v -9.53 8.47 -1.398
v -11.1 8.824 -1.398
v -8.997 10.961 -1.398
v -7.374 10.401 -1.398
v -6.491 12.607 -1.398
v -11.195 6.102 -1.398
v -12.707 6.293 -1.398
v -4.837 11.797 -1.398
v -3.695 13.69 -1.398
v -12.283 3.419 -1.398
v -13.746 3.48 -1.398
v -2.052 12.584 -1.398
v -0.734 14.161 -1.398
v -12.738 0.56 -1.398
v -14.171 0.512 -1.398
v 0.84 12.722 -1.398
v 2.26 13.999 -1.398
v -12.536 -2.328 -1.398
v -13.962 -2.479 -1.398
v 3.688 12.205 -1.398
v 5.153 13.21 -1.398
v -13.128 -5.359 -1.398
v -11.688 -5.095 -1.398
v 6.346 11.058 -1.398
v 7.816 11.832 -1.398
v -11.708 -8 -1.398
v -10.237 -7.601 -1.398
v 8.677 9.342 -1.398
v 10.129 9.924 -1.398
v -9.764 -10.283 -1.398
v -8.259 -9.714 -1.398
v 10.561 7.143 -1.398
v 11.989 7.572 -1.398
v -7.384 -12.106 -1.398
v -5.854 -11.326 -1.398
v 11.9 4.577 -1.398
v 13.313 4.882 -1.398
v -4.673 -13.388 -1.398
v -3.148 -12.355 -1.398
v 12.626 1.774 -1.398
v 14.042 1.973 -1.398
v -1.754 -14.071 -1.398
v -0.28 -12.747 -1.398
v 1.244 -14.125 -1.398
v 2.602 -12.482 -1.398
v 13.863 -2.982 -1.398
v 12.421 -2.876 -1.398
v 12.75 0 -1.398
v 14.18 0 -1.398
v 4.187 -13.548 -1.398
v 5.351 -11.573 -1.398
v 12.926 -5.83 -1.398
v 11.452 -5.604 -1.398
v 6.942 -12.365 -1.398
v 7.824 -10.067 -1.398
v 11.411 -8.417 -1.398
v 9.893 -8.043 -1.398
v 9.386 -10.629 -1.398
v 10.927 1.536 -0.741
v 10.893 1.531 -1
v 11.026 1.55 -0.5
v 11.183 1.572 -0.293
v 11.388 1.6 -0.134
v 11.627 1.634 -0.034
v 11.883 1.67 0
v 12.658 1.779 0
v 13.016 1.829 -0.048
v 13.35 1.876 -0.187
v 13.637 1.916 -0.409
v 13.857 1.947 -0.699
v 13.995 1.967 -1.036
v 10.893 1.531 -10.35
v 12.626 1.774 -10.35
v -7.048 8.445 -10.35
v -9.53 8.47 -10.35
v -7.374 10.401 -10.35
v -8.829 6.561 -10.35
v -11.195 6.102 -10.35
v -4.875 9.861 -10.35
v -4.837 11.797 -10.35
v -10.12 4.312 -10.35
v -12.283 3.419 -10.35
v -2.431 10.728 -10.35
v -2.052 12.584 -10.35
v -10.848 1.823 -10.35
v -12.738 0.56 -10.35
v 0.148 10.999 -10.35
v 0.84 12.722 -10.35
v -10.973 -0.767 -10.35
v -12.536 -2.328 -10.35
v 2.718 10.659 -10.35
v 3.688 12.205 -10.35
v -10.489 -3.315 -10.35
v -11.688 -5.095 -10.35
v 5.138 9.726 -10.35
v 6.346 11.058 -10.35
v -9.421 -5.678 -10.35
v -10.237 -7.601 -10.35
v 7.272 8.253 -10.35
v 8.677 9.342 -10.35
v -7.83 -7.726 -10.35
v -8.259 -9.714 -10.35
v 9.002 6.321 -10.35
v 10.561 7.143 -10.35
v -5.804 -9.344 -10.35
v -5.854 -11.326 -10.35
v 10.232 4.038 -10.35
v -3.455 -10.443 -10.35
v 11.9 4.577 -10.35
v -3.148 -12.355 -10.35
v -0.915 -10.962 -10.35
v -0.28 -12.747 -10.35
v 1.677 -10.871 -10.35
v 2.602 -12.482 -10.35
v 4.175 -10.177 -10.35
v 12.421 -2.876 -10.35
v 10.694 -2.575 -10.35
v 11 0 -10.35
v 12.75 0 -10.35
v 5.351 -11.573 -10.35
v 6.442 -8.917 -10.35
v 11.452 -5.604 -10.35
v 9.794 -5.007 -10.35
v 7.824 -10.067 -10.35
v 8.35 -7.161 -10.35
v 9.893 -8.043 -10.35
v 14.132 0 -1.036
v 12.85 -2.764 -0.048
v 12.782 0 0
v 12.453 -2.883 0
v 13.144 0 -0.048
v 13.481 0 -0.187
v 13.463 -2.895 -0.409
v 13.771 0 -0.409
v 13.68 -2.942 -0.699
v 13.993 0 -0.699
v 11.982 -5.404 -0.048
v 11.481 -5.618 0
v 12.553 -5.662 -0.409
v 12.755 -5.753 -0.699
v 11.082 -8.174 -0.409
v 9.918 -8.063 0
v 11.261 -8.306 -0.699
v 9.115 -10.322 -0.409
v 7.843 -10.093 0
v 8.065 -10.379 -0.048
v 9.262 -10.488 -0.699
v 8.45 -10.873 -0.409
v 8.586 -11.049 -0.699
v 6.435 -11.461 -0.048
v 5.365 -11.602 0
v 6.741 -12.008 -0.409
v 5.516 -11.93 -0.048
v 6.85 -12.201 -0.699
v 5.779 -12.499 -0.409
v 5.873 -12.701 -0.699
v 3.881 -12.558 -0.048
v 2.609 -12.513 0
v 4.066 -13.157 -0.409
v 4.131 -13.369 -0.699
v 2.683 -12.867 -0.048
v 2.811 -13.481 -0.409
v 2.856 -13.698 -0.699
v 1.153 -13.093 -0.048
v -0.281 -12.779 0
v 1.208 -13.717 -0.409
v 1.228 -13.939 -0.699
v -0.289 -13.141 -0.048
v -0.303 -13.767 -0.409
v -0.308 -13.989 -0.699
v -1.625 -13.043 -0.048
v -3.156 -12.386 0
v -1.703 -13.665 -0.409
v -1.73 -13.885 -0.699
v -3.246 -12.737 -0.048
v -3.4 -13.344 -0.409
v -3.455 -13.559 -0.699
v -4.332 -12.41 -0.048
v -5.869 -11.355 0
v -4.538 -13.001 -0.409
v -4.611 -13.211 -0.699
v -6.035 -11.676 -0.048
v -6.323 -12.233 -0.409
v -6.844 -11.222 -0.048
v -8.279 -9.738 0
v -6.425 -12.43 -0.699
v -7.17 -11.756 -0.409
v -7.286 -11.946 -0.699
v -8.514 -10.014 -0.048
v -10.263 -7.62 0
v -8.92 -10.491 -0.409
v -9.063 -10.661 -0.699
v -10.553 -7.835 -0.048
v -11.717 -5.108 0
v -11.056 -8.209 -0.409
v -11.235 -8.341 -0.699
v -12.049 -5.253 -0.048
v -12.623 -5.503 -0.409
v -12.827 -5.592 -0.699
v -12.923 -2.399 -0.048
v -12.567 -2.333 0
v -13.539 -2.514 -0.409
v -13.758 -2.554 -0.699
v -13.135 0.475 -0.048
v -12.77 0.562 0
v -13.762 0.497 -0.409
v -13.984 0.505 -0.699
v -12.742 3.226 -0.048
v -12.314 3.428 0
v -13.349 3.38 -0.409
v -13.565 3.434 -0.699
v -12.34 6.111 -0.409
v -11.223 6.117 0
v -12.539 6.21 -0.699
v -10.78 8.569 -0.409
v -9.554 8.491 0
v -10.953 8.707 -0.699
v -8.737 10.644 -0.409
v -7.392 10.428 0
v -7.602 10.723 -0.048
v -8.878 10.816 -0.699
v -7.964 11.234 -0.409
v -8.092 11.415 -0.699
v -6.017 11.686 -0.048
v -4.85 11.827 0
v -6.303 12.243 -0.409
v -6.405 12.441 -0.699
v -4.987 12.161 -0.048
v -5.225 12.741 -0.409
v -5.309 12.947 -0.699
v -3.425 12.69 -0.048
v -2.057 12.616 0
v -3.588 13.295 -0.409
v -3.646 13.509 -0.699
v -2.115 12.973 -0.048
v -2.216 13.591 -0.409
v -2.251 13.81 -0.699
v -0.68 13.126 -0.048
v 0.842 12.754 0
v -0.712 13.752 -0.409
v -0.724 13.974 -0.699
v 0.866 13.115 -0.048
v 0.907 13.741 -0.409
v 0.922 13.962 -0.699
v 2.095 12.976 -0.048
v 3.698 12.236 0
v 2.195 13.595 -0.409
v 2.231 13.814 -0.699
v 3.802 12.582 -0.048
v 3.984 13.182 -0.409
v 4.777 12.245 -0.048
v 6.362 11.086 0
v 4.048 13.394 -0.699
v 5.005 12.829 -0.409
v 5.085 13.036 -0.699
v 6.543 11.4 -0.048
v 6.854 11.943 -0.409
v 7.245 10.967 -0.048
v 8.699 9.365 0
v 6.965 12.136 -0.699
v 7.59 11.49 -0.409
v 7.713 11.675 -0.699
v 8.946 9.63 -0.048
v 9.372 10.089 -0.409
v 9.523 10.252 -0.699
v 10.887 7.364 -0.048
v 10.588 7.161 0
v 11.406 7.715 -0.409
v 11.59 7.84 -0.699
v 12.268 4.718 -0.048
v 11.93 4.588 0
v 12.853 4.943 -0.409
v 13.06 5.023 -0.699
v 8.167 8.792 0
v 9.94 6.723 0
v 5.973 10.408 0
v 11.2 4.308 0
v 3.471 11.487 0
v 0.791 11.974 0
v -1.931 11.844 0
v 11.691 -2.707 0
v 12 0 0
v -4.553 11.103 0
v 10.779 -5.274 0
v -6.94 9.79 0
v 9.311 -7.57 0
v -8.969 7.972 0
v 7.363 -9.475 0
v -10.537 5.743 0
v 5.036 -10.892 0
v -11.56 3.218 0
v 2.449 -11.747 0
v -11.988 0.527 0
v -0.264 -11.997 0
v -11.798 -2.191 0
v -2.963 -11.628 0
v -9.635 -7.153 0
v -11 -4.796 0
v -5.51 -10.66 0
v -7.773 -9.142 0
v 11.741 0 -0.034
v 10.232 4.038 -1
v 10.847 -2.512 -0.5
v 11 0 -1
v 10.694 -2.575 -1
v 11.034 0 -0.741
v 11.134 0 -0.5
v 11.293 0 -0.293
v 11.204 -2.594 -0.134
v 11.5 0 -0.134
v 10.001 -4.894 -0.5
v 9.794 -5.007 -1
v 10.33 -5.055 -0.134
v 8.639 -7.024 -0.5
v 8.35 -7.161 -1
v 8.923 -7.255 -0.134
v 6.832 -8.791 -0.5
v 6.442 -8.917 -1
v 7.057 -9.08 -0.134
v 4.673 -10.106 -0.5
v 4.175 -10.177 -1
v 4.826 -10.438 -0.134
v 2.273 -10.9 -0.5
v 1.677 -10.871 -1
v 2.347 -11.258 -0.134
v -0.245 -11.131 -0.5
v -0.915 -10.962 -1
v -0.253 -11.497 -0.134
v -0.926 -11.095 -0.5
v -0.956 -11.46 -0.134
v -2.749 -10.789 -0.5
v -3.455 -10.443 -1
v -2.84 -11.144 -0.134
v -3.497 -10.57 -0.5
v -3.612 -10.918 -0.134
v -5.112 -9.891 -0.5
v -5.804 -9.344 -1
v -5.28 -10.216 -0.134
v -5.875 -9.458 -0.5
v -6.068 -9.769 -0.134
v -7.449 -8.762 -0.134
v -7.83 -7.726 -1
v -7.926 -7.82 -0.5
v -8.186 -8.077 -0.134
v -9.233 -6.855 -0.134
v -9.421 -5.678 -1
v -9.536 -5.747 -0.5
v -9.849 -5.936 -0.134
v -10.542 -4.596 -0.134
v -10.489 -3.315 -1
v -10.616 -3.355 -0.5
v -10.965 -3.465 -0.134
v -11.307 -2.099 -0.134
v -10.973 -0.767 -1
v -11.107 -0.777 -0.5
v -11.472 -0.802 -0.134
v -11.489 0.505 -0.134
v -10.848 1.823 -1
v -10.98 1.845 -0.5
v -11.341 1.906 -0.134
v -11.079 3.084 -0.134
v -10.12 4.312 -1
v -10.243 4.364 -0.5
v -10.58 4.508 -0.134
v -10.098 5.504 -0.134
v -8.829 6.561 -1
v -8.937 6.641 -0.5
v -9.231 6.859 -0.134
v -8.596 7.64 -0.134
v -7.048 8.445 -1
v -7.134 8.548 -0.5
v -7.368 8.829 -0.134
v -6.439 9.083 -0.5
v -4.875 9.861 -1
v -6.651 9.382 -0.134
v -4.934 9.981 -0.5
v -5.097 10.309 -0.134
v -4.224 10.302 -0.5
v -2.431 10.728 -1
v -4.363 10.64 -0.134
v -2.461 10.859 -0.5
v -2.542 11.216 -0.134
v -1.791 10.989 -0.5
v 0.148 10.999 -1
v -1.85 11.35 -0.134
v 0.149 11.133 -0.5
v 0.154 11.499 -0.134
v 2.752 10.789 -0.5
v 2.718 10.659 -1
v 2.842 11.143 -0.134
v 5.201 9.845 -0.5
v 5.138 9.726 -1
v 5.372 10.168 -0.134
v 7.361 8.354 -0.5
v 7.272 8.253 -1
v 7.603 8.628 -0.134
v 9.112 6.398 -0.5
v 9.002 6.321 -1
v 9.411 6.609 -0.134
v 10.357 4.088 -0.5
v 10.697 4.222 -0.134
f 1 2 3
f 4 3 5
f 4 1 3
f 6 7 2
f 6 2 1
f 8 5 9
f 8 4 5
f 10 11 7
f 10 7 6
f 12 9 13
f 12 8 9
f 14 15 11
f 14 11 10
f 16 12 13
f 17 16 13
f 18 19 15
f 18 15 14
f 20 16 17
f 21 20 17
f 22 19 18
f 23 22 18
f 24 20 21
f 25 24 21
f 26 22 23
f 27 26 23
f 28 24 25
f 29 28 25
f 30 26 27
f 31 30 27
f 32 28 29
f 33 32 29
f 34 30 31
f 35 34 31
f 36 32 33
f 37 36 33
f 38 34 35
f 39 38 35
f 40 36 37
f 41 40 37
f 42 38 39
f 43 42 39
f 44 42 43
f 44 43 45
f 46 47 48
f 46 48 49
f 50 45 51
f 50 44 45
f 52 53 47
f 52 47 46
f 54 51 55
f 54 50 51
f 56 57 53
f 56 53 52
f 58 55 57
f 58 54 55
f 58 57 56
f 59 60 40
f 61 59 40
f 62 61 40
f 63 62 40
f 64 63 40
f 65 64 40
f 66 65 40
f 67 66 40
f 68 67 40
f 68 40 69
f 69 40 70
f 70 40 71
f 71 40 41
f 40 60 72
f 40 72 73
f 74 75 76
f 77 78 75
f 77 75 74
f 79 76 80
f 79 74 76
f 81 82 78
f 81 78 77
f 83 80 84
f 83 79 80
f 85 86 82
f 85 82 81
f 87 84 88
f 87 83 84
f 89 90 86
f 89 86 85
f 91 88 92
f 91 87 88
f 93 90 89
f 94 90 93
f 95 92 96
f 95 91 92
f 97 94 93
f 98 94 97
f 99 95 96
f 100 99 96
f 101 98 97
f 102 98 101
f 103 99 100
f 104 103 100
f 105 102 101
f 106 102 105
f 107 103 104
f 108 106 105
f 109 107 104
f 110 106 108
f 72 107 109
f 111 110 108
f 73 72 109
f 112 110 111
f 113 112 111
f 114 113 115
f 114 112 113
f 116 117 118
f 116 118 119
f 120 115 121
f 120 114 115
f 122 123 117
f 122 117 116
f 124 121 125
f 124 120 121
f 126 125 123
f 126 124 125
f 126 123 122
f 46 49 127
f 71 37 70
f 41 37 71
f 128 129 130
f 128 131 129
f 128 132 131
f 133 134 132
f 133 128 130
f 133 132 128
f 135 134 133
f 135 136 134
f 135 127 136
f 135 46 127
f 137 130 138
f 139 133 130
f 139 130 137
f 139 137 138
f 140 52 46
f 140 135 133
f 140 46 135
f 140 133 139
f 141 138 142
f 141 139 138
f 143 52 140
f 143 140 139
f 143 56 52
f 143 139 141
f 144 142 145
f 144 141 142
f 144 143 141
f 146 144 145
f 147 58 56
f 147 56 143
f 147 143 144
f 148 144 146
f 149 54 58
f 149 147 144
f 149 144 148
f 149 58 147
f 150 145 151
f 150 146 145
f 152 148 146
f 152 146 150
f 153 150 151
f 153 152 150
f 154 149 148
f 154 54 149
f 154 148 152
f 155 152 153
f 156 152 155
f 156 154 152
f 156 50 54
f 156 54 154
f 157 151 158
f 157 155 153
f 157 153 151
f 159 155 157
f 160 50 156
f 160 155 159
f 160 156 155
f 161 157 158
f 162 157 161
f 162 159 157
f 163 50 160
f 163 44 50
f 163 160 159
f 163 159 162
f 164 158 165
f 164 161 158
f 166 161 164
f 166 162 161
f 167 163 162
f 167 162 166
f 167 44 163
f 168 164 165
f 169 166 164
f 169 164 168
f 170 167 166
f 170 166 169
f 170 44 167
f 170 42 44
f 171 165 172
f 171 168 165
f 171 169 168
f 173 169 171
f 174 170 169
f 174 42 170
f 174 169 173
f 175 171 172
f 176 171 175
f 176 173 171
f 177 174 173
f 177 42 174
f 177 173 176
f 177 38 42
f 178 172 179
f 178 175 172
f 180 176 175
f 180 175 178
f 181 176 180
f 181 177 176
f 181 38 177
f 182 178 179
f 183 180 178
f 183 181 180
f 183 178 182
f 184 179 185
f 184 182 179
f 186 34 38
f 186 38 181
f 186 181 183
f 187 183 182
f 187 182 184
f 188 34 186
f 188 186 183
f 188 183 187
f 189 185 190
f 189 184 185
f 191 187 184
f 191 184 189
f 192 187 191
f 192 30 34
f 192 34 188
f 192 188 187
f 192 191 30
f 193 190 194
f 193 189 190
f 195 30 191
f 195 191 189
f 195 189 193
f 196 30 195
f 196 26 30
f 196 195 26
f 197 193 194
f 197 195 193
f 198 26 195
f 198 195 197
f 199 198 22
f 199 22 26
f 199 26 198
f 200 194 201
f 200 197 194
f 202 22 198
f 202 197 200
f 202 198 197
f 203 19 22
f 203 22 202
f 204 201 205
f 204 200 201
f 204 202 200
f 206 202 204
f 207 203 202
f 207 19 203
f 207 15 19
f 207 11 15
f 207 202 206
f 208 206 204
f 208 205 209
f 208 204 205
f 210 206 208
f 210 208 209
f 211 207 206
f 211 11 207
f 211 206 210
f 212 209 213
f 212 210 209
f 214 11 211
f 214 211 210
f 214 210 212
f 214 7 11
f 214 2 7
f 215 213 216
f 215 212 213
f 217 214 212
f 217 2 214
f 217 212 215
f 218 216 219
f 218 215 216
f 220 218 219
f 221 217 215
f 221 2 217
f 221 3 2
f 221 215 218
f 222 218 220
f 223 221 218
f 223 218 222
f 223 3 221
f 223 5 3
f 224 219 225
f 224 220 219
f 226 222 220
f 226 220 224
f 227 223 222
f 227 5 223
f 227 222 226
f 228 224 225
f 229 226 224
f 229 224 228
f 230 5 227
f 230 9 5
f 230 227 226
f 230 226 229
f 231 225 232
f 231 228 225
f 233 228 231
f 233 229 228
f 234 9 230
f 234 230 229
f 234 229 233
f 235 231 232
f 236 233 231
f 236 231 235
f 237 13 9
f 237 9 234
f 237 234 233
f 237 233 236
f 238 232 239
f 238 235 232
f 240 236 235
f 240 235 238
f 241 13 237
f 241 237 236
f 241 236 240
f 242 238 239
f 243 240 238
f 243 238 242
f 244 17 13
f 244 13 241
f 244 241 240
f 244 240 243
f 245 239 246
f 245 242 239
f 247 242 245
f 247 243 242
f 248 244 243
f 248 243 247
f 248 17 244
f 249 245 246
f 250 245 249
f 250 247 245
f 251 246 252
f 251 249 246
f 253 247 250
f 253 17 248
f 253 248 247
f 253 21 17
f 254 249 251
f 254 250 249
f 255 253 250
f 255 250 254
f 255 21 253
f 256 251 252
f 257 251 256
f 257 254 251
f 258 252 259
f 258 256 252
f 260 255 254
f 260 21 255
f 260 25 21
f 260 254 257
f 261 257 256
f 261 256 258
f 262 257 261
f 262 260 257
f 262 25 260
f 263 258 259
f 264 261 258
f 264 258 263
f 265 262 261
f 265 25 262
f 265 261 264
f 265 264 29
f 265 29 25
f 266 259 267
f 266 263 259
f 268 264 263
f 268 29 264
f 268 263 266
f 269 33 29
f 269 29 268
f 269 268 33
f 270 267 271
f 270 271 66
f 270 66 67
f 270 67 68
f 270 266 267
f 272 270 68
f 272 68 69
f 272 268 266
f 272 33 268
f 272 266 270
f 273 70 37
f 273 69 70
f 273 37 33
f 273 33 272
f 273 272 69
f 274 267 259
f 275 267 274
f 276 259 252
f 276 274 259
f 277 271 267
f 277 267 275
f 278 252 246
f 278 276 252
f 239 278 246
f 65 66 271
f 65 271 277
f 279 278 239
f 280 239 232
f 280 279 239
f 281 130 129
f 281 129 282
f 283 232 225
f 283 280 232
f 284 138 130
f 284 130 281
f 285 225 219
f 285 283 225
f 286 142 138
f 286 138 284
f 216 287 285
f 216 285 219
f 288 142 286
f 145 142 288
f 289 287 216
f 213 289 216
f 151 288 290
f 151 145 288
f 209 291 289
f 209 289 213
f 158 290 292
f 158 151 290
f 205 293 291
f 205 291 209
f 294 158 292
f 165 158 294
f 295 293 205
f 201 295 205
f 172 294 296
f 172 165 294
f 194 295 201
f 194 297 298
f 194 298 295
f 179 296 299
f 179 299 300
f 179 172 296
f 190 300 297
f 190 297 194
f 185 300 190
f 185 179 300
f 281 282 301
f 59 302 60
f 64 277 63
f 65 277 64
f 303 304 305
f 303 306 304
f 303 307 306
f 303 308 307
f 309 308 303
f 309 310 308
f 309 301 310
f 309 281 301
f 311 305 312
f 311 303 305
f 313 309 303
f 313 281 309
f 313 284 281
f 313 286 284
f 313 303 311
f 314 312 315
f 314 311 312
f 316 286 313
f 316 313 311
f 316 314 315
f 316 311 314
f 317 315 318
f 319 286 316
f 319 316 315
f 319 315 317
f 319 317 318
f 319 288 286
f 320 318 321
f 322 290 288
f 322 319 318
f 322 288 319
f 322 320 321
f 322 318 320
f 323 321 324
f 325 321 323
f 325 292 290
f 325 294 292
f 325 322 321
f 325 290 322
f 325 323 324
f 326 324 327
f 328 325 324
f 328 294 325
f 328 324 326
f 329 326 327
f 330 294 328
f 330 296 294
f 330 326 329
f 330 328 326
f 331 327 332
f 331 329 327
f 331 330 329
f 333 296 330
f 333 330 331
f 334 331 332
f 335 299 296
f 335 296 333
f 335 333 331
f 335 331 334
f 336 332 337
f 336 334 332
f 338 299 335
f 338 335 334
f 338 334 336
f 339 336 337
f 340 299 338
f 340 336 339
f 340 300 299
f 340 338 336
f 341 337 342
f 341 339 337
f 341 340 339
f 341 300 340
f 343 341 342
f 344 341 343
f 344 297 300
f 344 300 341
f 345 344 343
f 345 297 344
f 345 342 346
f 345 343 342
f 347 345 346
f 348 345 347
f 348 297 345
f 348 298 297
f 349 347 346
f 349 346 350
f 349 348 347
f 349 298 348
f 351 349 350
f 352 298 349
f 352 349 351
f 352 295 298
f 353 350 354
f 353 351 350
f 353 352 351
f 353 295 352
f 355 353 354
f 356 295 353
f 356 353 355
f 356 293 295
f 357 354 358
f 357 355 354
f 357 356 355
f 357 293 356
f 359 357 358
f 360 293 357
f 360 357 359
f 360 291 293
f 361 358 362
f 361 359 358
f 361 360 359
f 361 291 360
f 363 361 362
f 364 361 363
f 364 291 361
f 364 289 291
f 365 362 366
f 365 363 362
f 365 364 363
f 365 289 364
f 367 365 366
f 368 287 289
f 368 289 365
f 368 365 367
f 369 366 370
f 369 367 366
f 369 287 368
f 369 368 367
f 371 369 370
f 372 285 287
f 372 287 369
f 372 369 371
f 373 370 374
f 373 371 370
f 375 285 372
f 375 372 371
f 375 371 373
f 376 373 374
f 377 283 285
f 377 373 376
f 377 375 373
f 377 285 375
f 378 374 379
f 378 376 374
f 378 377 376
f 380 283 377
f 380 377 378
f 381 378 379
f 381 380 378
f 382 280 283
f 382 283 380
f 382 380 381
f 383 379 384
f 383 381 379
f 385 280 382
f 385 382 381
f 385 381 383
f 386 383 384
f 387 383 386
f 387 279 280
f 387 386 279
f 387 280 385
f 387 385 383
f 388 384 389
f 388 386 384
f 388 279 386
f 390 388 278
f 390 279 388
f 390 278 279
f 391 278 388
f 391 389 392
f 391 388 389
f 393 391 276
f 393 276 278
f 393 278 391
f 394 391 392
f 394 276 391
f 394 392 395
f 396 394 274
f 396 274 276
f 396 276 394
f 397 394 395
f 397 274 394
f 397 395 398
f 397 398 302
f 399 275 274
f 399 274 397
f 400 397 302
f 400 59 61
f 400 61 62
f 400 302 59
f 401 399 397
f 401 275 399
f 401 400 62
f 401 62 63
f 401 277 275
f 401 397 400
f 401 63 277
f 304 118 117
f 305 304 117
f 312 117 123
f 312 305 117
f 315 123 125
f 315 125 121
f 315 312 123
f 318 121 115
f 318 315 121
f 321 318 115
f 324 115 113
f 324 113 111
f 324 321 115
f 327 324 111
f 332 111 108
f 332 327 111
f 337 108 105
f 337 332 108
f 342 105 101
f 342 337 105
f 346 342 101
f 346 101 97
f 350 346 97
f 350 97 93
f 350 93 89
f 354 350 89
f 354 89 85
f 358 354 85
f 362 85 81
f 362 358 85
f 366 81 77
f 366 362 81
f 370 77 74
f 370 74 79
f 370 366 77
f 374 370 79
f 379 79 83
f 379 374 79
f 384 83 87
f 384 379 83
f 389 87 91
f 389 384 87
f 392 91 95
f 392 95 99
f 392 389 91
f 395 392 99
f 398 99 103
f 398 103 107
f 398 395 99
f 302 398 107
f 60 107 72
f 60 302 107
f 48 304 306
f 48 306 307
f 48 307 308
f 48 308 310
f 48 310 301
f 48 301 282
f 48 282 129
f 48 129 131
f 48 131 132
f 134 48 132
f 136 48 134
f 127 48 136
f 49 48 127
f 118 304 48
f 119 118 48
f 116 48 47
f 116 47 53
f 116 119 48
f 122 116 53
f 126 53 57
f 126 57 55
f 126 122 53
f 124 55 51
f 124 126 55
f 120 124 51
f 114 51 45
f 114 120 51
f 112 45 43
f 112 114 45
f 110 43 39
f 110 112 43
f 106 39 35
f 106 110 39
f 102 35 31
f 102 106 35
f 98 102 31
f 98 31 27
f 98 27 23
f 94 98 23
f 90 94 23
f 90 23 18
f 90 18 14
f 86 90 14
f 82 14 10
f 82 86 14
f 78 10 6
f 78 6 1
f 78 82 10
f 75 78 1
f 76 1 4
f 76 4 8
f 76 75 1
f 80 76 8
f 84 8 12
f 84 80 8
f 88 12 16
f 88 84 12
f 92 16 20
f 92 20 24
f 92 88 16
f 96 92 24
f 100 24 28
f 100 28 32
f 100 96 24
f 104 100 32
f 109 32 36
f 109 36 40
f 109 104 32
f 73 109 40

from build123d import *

# Parameters (mm, degrees)
REVOLVE1_ANGLE = 352


with BuildPart() as part:
    # Sketch1 → Revolve1 (revolve)
    with BuildSketch(Plane(origin=(0, 0, 0), x_dir=(1, 0, 0), z_dir=(0, 1, 0))):
        with BuildLine():
            Line((11, 10.35), (11, 1))
            ThreePointArc((11, 1), (11.292893219, 0.292893219), (12, 0))
            Line((12, 0), (12.782227205, 0))
            ThreePointArc((12.782227205, 0), (13.770601827, 0.409398173), (14.18, 1.397772795))
            Line((14.18, 1.397772795), (12.75, 1.397772795))
            Line((12.75, 1.397772795), (12.75, 10.35))
            Line((12.75, 10.35), (11, 10.35))
        make_face()
    revolve(axis=Axis((0, 0, 0), (0, 0, -1)), revolution_arc=REVOLVE1_ANGLE)


solid = part.part
